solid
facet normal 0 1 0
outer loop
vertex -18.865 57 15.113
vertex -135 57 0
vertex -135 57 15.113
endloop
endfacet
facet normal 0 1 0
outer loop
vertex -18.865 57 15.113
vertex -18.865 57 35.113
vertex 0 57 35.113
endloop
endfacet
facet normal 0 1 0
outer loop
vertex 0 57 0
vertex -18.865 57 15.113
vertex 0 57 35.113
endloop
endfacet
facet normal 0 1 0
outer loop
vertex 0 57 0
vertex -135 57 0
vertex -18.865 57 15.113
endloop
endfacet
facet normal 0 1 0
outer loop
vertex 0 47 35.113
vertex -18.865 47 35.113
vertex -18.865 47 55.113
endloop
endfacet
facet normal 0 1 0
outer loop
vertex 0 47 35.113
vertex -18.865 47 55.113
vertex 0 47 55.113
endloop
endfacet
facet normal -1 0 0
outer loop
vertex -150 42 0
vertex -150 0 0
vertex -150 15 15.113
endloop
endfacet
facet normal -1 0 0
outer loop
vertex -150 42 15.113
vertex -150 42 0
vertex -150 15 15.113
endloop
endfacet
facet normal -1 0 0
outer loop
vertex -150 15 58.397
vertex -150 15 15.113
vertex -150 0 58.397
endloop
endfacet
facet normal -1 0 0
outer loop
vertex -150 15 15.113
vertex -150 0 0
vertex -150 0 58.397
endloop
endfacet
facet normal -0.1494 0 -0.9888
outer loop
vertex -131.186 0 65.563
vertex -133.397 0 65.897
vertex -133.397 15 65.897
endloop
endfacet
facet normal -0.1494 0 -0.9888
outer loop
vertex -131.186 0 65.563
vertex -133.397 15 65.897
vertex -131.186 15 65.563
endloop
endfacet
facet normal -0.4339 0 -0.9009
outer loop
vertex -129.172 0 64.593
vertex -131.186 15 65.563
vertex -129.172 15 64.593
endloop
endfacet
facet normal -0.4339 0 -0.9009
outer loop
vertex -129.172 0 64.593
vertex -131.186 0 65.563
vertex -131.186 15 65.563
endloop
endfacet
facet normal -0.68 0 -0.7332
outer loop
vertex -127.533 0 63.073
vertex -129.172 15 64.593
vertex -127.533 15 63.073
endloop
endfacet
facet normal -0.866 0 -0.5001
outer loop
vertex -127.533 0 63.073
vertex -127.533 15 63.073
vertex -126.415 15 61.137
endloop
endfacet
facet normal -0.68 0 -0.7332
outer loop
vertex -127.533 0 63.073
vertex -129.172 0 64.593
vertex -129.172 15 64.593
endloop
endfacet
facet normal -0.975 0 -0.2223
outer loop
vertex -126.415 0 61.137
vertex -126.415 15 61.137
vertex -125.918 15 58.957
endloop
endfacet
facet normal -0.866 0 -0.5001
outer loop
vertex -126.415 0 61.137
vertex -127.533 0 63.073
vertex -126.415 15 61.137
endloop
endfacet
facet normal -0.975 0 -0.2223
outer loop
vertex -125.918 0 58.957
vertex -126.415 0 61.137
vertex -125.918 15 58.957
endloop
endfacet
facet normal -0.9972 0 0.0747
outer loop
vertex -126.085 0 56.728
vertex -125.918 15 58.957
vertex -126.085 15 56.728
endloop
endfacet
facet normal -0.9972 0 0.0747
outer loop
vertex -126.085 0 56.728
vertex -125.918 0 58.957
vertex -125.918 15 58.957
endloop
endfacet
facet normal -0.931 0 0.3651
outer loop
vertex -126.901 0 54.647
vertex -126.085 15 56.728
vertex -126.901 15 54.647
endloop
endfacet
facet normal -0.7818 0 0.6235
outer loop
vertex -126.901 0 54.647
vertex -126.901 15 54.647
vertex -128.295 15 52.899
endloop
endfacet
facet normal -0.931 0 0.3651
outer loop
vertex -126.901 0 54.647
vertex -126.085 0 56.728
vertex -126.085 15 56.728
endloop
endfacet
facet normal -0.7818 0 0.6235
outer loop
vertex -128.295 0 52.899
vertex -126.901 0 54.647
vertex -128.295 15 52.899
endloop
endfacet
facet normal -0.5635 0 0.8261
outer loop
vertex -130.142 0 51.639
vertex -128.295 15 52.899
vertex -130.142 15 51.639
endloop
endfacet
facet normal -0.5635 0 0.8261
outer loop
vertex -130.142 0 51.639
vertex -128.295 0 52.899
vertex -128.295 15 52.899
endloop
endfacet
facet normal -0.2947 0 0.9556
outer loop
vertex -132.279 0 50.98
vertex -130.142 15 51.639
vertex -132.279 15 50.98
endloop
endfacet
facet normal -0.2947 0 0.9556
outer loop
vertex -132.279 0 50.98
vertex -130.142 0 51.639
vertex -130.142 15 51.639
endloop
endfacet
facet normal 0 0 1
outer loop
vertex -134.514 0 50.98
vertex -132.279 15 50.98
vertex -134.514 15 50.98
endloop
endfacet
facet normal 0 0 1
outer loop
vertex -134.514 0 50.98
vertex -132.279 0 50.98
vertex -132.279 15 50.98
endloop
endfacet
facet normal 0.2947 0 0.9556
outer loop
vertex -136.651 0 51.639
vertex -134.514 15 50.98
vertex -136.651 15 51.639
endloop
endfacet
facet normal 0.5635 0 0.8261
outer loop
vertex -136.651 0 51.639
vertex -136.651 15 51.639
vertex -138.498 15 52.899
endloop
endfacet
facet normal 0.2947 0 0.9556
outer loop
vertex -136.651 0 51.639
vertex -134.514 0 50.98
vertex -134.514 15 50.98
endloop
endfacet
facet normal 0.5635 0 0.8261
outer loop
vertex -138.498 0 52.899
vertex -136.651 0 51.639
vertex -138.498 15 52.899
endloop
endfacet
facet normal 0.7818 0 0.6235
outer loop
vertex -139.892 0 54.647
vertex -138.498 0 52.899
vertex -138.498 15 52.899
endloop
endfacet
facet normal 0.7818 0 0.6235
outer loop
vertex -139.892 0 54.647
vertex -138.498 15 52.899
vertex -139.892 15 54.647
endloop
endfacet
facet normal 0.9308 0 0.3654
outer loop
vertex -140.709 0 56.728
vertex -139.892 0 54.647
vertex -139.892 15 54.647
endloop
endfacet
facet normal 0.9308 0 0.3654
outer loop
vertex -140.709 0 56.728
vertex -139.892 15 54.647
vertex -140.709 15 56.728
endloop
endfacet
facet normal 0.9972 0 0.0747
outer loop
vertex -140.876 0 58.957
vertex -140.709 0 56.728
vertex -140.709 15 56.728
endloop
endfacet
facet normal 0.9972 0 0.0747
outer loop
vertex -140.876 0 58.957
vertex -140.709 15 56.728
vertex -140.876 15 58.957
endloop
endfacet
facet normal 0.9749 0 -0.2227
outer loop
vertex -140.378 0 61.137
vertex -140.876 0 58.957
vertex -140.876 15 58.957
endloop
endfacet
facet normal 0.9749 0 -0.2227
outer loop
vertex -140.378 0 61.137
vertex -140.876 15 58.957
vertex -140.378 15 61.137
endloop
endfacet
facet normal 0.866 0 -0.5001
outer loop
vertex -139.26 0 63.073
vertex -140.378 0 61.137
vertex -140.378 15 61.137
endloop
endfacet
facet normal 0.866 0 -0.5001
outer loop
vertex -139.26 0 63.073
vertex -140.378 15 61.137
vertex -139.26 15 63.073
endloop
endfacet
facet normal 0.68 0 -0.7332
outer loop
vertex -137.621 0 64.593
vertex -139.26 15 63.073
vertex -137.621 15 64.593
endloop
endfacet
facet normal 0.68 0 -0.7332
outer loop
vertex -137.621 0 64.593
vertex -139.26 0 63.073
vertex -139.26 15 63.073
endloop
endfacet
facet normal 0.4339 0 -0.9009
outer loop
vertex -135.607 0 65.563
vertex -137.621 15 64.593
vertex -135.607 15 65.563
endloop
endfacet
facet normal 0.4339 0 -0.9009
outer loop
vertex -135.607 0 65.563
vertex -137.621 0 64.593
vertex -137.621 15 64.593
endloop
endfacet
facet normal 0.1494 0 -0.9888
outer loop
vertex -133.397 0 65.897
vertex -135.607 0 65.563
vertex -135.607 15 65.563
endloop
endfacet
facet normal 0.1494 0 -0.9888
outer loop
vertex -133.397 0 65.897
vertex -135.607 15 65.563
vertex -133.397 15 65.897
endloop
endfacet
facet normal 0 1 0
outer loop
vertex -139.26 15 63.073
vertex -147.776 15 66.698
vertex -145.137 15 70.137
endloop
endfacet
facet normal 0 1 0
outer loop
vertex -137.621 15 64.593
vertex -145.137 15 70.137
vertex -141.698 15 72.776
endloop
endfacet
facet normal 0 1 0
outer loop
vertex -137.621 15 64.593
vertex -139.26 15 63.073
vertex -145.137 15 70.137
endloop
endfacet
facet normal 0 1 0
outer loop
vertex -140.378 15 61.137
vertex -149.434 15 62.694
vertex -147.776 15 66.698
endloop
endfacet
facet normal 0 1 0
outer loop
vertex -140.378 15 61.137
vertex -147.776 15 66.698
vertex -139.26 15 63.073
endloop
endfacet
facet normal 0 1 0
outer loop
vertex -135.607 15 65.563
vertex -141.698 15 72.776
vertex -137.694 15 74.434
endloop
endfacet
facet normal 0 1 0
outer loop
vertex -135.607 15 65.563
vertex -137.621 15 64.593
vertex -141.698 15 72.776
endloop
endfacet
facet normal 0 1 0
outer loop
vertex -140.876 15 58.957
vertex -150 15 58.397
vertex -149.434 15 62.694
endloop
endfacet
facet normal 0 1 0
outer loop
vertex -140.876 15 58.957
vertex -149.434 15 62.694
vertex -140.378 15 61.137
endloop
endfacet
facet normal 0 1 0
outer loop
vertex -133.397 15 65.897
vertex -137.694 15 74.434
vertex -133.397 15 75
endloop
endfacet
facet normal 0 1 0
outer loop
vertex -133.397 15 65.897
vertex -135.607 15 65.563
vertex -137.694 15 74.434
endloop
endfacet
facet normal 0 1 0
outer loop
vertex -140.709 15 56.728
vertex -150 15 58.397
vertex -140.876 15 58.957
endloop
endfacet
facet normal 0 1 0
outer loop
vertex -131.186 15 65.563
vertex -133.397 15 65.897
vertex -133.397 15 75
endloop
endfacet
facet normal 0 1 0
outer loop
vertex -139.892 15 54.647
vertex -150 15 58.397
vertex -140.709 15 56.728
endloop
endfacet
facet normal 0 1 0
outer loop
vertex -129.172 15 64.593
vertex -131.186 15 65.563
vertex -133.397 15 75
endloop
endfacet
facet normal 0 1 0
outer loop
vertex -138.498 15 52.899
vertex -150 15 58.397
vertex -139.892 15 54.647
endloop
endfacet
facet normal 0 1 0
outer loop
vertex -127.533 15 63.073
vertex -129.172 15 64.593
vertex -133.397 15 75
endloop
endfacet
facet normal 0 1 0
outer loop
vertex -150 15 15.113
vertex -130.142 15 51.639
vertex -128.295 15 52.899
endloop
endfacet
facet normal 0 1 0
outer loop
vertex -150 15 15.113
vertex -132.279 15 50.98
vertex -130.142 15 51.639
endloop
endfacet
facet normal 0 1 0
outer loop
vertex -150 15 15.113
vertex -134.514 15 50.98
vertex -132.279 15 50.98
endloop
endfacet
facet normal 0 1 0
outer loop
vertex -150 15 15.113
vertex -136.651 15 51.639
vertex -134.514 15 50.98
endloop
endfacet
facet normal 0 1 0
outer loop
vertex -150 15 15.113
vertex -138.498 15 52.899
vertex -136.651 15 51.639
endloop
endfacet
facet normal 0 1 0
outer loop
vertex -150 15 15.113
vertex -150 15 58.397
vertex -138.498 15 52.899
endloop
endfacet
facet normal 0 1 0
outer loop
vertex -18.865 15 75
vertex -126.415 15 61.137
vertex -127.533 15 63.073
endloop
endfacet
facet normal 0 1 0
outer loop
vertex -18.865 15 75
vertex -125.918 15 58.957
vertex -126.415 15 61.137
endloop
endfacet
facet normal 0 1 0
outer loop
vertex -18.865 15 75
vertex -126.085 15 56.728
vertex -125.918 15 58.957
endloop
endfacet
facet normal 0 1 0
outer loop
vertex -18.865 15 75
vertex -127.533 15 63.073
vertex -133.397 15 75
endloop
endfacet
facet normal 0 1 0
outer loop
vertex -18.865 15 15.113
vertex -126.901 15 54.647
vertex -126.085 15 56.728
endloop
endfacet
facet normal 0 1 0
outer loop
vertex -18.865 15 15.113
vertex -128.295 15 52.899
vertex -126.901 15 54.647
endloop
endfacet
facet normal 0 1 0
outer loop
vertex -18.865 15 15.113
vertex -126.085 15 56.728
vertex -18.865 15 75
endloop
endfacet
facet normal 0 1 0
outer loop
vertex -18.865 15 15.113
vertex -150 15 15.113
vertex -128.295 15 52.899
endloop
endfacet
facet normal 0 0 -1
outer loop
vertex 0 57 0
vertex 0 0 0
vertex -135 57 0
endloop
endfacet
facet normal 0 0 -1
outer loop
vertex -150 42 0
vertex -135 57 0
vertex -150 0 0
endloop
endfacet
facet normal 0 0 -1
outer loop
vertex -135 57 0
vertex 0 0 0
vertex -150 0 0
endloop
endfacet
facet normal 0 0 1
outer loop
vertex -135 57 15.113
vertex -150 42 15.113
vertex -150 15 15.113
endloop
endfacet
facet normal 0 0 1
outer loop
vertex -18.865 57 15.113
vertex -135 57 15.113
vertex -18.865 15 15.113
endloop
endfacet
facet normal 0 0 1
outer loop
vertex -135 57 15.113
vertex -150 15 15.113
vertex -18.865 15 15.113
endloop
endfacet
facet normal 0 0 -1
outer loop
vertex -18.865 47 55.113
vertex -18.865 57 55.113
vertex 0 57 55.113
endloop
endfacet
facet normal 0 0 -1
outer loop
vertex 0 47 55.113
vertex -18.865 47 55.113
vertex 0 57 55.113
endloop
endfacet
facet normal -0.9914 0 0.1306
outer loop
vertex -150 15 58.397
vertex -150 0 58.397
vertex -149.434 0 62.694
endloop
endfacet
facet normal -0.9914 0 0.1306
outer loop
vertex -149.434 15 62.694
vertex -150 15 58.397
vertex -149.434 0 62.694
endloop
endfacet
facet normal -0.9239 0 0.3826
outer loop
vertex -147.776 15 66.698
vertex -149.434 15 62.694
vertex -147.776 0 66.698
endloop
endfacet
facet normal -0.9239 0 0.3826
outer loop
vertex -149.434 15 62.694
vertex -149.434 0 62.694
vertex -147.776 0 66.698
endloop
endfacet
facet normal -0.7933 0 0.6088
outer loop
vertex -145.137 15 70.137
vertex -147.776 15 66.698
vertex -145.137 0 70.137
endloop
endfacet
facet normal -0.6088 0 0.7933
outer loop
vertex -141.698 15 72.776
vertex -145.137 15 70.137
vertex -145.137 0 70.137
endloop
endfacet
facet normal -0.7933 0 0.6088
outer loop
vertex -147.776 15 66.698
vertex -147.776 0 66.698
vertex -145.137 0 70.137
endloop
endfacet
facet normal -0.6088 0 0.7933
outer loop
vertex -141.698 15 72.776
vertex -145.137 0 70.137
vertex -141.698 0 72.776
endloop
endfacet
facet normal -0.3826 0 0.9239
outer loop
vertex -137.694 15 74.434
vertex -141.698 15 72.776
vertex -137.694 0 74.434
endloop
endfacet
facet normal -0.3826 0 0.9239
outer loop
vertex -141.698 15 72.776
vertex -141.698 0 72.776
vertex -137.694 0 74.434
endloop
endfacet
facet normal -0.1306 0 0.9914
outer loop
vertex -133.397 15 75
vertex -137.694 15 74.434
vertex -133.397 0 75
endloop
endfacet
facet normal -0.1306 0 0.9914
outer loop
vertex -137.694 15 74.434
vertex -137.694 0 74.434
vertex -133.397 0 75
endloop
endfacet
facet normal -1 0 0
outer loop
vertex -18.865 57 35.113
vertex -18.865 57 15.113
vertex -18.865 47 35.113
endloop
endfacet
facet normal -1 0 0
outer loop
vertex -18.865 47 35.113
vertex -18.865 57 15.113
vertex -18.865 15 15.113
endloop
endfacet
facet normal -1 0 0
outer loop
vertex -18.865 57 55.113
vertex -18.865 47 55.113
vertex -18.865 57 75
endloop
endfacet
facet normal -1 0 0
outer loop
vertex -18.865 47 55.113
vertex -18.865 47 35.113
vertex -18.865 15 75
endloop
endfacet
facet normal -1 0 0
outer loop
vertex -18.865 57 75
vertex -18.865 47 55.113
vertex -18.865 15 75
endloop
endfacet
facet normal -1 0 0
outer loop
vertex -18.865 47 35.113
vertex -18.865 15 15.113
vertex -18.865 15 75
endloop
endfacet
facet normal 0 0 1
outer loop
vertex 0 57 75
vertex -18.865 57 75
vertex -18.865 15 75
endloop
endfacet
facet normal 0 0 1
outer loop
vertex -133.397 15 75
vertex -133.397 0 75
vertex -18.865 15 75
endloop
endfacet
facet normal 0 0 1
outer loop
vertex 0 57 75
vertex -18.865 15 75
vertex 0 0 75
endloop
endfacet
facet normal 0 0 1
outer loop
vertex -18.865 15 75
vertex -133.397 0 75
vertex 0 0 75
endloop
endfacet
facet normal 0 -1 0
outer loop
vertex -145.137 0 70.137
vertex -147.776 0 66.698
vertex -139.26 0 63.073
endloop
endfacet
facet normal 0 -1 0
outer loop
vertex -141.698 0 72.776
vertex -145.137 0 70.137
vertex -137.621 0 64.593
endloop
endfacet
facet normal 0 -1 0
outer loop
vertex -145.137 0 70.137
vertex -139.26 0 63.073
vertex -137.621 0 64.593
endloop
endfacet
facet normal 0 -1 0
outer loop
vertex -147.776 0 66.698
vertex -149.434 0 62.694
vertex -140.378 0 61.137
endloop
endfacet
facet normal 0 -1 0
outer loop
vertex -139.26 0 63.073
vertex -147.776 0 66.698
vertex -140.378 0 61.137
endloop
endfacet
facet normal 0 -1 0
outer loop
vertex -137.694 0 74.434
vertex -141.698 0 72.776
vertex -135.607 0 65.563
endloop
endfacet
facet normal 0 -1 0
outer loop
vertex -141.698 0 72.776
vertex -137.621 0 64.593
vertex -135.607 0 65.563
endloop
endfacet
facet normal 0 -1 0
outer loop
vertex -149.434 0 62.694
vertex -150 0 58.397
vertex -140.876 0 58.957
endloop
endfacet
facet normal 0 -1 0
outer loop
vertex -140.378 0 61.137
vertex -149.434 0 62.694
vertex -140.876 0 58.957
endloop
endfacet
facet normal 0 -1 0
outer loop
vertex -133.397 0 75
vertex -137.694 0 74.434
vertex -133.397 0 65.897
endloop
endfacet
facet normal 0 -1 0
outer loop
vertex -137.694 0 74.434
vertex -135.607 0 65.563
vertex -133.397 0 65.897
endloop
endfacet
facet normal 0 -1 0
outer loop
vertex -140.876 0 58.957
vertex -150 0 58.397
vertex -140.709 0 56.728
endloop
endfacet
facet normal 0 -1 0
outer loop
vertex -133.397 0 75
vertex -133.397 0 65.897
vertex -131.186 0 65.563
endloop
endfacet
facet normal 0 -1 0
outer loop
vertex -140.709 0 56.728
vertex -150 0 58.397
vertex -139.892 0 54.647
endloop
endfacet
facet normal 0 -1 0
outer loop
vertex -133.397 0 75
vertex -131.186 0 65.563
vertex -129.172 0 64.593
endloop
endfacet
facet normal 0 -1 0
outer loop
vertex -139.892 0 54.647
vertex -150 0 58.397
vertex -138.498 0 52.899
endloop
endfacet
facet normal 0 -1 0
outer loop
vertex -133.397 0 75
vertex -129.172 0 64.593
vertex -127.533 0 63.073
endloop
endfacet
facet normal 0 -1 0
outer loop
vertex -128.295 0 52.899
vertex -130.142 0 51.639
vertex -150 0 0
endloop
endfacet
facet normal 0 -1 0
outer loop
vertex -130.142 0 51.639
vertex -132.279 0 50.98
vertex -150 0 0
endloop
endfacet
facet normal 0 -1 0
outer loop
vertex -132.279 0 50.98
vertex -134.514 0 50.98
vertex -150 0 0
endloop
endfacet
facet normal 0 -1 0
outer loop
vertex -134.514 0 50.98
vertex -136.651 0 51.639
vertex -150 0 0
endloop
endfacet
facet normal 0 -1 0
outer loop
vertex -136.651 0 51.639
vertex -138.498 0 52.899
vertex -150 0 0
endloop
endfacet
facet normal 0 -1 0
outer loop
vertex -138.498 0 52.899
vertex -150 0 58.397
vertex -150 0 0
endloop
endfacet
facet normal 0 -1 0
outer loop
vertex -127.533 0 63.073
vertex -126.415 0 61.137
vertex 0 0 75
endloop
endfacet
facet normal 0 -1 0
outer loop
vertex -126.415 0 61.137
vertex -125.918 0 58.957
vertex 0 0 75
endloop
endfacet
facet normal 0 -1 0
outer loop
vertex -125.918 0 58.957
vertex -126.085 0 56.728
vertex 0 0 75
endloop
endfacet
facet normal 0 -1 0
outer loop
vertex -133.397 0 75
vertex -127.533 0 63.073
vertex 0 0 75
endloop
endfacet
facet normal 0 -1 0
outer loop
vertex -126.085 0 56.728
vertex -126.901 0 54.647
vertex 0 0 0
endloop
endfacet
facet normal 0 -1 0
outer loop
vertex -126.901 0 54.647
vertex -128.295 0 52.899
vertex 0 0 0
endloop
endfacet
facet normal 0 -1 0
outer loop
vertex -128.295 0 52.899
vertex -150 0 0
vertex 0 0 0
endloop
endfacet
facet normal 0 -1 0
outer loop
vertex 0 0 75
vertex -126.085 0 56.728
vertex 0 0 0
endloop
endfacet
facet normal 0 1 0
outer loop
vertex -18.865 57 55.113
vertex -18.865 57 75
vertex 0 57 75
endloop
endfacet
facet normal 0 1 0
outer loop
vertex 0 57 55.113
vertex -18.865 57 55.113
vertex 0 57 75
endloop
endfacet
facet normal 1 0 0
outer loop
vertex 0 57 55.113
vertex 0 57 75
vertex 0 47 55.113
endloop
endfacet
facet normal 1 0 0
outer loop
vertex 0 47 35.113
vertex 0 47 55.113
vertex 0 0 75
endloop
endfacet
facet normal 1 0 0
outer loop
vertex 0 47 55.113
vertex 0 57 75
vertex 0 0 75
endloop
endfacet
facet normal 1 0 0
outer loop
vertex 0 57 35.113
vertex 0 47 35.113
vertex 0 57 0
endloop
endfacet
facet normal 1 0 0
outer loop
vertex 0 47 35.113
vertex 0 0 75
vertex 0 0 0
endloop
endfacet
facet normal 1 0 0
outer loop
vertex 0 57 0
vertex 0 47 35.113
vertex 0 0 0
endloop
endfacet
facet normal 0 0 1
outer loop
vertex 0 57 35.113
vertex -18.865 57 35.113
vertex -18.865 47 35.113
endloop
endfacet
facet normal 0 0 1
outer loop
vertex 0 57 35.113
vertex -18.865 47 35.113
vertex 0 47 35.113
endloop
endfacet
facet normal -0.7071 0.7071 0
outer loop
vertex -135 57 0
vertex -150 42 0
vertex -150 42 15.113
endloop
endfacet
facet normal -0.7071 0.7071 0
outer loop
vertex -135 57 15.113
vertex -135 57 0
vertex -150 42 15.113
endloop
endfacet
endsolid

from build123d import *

# Parameters (mm, degrees)
SKETCH1_R           = 7.5
BOSS_EXTRUDE1_DEPTH = 15
BOSS_EXTRUDE2_DEPTH = 42
CHAMFER2_SIZE       = 15
SKETCH4_W           = 18.864791466
SKETCH4_H           = 20
CUT_EXTRUDE2_DEPTH  = 10


with BuildPart() as part:
    # Sketch1 → Boss-Extrude1 (new body)
    with BuildSketch(Plane(origin=(0, 0, 0), x_dir=(1, 0, 0), z_dir=(0, 1, 0))):
        with BuildLine():
            Line((-133.396551724, -75), (0, -75))
            Line((0, -75), (0, 0))
            Line((0, 0), (-150, 0))
            Line((-150, 0), (-150, -58.396551724))
            ThreePointArc((-150, -58.396551724), (-145.136962591, -70.136962591), (-133.396551724, -75))
        make_face()
        with Locations(Location((-133.396551724, -58.396551724, 0), (0, 0, 270))):
            Circle(SKETCH1_R, mode=Mode.SUBTRACT)
    extrude(amount=BOSS_EXTRUDE1_DEPTH)

    # Sketch3 → Boss-Extrude2 (add)
    with BuildSketch(Plane(origin=(0, 15, 0), x_dir=(1, 0, 0), z_dir=(0, 1, 0))):
        Polygon((0, 0), (-150, 0), (-150, -15.113333235), (-18.864791466, -15.113333235), (-18.864791466, -75), (0, -75), (0, -15.113333235), align=None)
    extrude(amount=BOSS_EXTRUDE2_DEPTH)

    # Chamfer2
    chamfer2_edges = [part.edges().sort_by_distance(p)[0] for p in [
        (-150, 57, 7.556666618),
    ]]
    chamfer(chamfer2_edges, length=CHAMFER2_SIZE)

    # Sketch4 → Cut-Extrude2 (cut)
    with BuildSketch(Plane(origin=(0, 57, 0), x_dir=(1, 0, 0), z_dir=(0, 1, 0))):
        with Locations((-9.432395733, -45.113333235)):
            Rectangle(SKETCH4_W, SKETCH4_H)
    extrude(amount=-CUT_EXTRUDE2_DEPTH, mode=Mode.SUBTRACT)


solid = part.part
